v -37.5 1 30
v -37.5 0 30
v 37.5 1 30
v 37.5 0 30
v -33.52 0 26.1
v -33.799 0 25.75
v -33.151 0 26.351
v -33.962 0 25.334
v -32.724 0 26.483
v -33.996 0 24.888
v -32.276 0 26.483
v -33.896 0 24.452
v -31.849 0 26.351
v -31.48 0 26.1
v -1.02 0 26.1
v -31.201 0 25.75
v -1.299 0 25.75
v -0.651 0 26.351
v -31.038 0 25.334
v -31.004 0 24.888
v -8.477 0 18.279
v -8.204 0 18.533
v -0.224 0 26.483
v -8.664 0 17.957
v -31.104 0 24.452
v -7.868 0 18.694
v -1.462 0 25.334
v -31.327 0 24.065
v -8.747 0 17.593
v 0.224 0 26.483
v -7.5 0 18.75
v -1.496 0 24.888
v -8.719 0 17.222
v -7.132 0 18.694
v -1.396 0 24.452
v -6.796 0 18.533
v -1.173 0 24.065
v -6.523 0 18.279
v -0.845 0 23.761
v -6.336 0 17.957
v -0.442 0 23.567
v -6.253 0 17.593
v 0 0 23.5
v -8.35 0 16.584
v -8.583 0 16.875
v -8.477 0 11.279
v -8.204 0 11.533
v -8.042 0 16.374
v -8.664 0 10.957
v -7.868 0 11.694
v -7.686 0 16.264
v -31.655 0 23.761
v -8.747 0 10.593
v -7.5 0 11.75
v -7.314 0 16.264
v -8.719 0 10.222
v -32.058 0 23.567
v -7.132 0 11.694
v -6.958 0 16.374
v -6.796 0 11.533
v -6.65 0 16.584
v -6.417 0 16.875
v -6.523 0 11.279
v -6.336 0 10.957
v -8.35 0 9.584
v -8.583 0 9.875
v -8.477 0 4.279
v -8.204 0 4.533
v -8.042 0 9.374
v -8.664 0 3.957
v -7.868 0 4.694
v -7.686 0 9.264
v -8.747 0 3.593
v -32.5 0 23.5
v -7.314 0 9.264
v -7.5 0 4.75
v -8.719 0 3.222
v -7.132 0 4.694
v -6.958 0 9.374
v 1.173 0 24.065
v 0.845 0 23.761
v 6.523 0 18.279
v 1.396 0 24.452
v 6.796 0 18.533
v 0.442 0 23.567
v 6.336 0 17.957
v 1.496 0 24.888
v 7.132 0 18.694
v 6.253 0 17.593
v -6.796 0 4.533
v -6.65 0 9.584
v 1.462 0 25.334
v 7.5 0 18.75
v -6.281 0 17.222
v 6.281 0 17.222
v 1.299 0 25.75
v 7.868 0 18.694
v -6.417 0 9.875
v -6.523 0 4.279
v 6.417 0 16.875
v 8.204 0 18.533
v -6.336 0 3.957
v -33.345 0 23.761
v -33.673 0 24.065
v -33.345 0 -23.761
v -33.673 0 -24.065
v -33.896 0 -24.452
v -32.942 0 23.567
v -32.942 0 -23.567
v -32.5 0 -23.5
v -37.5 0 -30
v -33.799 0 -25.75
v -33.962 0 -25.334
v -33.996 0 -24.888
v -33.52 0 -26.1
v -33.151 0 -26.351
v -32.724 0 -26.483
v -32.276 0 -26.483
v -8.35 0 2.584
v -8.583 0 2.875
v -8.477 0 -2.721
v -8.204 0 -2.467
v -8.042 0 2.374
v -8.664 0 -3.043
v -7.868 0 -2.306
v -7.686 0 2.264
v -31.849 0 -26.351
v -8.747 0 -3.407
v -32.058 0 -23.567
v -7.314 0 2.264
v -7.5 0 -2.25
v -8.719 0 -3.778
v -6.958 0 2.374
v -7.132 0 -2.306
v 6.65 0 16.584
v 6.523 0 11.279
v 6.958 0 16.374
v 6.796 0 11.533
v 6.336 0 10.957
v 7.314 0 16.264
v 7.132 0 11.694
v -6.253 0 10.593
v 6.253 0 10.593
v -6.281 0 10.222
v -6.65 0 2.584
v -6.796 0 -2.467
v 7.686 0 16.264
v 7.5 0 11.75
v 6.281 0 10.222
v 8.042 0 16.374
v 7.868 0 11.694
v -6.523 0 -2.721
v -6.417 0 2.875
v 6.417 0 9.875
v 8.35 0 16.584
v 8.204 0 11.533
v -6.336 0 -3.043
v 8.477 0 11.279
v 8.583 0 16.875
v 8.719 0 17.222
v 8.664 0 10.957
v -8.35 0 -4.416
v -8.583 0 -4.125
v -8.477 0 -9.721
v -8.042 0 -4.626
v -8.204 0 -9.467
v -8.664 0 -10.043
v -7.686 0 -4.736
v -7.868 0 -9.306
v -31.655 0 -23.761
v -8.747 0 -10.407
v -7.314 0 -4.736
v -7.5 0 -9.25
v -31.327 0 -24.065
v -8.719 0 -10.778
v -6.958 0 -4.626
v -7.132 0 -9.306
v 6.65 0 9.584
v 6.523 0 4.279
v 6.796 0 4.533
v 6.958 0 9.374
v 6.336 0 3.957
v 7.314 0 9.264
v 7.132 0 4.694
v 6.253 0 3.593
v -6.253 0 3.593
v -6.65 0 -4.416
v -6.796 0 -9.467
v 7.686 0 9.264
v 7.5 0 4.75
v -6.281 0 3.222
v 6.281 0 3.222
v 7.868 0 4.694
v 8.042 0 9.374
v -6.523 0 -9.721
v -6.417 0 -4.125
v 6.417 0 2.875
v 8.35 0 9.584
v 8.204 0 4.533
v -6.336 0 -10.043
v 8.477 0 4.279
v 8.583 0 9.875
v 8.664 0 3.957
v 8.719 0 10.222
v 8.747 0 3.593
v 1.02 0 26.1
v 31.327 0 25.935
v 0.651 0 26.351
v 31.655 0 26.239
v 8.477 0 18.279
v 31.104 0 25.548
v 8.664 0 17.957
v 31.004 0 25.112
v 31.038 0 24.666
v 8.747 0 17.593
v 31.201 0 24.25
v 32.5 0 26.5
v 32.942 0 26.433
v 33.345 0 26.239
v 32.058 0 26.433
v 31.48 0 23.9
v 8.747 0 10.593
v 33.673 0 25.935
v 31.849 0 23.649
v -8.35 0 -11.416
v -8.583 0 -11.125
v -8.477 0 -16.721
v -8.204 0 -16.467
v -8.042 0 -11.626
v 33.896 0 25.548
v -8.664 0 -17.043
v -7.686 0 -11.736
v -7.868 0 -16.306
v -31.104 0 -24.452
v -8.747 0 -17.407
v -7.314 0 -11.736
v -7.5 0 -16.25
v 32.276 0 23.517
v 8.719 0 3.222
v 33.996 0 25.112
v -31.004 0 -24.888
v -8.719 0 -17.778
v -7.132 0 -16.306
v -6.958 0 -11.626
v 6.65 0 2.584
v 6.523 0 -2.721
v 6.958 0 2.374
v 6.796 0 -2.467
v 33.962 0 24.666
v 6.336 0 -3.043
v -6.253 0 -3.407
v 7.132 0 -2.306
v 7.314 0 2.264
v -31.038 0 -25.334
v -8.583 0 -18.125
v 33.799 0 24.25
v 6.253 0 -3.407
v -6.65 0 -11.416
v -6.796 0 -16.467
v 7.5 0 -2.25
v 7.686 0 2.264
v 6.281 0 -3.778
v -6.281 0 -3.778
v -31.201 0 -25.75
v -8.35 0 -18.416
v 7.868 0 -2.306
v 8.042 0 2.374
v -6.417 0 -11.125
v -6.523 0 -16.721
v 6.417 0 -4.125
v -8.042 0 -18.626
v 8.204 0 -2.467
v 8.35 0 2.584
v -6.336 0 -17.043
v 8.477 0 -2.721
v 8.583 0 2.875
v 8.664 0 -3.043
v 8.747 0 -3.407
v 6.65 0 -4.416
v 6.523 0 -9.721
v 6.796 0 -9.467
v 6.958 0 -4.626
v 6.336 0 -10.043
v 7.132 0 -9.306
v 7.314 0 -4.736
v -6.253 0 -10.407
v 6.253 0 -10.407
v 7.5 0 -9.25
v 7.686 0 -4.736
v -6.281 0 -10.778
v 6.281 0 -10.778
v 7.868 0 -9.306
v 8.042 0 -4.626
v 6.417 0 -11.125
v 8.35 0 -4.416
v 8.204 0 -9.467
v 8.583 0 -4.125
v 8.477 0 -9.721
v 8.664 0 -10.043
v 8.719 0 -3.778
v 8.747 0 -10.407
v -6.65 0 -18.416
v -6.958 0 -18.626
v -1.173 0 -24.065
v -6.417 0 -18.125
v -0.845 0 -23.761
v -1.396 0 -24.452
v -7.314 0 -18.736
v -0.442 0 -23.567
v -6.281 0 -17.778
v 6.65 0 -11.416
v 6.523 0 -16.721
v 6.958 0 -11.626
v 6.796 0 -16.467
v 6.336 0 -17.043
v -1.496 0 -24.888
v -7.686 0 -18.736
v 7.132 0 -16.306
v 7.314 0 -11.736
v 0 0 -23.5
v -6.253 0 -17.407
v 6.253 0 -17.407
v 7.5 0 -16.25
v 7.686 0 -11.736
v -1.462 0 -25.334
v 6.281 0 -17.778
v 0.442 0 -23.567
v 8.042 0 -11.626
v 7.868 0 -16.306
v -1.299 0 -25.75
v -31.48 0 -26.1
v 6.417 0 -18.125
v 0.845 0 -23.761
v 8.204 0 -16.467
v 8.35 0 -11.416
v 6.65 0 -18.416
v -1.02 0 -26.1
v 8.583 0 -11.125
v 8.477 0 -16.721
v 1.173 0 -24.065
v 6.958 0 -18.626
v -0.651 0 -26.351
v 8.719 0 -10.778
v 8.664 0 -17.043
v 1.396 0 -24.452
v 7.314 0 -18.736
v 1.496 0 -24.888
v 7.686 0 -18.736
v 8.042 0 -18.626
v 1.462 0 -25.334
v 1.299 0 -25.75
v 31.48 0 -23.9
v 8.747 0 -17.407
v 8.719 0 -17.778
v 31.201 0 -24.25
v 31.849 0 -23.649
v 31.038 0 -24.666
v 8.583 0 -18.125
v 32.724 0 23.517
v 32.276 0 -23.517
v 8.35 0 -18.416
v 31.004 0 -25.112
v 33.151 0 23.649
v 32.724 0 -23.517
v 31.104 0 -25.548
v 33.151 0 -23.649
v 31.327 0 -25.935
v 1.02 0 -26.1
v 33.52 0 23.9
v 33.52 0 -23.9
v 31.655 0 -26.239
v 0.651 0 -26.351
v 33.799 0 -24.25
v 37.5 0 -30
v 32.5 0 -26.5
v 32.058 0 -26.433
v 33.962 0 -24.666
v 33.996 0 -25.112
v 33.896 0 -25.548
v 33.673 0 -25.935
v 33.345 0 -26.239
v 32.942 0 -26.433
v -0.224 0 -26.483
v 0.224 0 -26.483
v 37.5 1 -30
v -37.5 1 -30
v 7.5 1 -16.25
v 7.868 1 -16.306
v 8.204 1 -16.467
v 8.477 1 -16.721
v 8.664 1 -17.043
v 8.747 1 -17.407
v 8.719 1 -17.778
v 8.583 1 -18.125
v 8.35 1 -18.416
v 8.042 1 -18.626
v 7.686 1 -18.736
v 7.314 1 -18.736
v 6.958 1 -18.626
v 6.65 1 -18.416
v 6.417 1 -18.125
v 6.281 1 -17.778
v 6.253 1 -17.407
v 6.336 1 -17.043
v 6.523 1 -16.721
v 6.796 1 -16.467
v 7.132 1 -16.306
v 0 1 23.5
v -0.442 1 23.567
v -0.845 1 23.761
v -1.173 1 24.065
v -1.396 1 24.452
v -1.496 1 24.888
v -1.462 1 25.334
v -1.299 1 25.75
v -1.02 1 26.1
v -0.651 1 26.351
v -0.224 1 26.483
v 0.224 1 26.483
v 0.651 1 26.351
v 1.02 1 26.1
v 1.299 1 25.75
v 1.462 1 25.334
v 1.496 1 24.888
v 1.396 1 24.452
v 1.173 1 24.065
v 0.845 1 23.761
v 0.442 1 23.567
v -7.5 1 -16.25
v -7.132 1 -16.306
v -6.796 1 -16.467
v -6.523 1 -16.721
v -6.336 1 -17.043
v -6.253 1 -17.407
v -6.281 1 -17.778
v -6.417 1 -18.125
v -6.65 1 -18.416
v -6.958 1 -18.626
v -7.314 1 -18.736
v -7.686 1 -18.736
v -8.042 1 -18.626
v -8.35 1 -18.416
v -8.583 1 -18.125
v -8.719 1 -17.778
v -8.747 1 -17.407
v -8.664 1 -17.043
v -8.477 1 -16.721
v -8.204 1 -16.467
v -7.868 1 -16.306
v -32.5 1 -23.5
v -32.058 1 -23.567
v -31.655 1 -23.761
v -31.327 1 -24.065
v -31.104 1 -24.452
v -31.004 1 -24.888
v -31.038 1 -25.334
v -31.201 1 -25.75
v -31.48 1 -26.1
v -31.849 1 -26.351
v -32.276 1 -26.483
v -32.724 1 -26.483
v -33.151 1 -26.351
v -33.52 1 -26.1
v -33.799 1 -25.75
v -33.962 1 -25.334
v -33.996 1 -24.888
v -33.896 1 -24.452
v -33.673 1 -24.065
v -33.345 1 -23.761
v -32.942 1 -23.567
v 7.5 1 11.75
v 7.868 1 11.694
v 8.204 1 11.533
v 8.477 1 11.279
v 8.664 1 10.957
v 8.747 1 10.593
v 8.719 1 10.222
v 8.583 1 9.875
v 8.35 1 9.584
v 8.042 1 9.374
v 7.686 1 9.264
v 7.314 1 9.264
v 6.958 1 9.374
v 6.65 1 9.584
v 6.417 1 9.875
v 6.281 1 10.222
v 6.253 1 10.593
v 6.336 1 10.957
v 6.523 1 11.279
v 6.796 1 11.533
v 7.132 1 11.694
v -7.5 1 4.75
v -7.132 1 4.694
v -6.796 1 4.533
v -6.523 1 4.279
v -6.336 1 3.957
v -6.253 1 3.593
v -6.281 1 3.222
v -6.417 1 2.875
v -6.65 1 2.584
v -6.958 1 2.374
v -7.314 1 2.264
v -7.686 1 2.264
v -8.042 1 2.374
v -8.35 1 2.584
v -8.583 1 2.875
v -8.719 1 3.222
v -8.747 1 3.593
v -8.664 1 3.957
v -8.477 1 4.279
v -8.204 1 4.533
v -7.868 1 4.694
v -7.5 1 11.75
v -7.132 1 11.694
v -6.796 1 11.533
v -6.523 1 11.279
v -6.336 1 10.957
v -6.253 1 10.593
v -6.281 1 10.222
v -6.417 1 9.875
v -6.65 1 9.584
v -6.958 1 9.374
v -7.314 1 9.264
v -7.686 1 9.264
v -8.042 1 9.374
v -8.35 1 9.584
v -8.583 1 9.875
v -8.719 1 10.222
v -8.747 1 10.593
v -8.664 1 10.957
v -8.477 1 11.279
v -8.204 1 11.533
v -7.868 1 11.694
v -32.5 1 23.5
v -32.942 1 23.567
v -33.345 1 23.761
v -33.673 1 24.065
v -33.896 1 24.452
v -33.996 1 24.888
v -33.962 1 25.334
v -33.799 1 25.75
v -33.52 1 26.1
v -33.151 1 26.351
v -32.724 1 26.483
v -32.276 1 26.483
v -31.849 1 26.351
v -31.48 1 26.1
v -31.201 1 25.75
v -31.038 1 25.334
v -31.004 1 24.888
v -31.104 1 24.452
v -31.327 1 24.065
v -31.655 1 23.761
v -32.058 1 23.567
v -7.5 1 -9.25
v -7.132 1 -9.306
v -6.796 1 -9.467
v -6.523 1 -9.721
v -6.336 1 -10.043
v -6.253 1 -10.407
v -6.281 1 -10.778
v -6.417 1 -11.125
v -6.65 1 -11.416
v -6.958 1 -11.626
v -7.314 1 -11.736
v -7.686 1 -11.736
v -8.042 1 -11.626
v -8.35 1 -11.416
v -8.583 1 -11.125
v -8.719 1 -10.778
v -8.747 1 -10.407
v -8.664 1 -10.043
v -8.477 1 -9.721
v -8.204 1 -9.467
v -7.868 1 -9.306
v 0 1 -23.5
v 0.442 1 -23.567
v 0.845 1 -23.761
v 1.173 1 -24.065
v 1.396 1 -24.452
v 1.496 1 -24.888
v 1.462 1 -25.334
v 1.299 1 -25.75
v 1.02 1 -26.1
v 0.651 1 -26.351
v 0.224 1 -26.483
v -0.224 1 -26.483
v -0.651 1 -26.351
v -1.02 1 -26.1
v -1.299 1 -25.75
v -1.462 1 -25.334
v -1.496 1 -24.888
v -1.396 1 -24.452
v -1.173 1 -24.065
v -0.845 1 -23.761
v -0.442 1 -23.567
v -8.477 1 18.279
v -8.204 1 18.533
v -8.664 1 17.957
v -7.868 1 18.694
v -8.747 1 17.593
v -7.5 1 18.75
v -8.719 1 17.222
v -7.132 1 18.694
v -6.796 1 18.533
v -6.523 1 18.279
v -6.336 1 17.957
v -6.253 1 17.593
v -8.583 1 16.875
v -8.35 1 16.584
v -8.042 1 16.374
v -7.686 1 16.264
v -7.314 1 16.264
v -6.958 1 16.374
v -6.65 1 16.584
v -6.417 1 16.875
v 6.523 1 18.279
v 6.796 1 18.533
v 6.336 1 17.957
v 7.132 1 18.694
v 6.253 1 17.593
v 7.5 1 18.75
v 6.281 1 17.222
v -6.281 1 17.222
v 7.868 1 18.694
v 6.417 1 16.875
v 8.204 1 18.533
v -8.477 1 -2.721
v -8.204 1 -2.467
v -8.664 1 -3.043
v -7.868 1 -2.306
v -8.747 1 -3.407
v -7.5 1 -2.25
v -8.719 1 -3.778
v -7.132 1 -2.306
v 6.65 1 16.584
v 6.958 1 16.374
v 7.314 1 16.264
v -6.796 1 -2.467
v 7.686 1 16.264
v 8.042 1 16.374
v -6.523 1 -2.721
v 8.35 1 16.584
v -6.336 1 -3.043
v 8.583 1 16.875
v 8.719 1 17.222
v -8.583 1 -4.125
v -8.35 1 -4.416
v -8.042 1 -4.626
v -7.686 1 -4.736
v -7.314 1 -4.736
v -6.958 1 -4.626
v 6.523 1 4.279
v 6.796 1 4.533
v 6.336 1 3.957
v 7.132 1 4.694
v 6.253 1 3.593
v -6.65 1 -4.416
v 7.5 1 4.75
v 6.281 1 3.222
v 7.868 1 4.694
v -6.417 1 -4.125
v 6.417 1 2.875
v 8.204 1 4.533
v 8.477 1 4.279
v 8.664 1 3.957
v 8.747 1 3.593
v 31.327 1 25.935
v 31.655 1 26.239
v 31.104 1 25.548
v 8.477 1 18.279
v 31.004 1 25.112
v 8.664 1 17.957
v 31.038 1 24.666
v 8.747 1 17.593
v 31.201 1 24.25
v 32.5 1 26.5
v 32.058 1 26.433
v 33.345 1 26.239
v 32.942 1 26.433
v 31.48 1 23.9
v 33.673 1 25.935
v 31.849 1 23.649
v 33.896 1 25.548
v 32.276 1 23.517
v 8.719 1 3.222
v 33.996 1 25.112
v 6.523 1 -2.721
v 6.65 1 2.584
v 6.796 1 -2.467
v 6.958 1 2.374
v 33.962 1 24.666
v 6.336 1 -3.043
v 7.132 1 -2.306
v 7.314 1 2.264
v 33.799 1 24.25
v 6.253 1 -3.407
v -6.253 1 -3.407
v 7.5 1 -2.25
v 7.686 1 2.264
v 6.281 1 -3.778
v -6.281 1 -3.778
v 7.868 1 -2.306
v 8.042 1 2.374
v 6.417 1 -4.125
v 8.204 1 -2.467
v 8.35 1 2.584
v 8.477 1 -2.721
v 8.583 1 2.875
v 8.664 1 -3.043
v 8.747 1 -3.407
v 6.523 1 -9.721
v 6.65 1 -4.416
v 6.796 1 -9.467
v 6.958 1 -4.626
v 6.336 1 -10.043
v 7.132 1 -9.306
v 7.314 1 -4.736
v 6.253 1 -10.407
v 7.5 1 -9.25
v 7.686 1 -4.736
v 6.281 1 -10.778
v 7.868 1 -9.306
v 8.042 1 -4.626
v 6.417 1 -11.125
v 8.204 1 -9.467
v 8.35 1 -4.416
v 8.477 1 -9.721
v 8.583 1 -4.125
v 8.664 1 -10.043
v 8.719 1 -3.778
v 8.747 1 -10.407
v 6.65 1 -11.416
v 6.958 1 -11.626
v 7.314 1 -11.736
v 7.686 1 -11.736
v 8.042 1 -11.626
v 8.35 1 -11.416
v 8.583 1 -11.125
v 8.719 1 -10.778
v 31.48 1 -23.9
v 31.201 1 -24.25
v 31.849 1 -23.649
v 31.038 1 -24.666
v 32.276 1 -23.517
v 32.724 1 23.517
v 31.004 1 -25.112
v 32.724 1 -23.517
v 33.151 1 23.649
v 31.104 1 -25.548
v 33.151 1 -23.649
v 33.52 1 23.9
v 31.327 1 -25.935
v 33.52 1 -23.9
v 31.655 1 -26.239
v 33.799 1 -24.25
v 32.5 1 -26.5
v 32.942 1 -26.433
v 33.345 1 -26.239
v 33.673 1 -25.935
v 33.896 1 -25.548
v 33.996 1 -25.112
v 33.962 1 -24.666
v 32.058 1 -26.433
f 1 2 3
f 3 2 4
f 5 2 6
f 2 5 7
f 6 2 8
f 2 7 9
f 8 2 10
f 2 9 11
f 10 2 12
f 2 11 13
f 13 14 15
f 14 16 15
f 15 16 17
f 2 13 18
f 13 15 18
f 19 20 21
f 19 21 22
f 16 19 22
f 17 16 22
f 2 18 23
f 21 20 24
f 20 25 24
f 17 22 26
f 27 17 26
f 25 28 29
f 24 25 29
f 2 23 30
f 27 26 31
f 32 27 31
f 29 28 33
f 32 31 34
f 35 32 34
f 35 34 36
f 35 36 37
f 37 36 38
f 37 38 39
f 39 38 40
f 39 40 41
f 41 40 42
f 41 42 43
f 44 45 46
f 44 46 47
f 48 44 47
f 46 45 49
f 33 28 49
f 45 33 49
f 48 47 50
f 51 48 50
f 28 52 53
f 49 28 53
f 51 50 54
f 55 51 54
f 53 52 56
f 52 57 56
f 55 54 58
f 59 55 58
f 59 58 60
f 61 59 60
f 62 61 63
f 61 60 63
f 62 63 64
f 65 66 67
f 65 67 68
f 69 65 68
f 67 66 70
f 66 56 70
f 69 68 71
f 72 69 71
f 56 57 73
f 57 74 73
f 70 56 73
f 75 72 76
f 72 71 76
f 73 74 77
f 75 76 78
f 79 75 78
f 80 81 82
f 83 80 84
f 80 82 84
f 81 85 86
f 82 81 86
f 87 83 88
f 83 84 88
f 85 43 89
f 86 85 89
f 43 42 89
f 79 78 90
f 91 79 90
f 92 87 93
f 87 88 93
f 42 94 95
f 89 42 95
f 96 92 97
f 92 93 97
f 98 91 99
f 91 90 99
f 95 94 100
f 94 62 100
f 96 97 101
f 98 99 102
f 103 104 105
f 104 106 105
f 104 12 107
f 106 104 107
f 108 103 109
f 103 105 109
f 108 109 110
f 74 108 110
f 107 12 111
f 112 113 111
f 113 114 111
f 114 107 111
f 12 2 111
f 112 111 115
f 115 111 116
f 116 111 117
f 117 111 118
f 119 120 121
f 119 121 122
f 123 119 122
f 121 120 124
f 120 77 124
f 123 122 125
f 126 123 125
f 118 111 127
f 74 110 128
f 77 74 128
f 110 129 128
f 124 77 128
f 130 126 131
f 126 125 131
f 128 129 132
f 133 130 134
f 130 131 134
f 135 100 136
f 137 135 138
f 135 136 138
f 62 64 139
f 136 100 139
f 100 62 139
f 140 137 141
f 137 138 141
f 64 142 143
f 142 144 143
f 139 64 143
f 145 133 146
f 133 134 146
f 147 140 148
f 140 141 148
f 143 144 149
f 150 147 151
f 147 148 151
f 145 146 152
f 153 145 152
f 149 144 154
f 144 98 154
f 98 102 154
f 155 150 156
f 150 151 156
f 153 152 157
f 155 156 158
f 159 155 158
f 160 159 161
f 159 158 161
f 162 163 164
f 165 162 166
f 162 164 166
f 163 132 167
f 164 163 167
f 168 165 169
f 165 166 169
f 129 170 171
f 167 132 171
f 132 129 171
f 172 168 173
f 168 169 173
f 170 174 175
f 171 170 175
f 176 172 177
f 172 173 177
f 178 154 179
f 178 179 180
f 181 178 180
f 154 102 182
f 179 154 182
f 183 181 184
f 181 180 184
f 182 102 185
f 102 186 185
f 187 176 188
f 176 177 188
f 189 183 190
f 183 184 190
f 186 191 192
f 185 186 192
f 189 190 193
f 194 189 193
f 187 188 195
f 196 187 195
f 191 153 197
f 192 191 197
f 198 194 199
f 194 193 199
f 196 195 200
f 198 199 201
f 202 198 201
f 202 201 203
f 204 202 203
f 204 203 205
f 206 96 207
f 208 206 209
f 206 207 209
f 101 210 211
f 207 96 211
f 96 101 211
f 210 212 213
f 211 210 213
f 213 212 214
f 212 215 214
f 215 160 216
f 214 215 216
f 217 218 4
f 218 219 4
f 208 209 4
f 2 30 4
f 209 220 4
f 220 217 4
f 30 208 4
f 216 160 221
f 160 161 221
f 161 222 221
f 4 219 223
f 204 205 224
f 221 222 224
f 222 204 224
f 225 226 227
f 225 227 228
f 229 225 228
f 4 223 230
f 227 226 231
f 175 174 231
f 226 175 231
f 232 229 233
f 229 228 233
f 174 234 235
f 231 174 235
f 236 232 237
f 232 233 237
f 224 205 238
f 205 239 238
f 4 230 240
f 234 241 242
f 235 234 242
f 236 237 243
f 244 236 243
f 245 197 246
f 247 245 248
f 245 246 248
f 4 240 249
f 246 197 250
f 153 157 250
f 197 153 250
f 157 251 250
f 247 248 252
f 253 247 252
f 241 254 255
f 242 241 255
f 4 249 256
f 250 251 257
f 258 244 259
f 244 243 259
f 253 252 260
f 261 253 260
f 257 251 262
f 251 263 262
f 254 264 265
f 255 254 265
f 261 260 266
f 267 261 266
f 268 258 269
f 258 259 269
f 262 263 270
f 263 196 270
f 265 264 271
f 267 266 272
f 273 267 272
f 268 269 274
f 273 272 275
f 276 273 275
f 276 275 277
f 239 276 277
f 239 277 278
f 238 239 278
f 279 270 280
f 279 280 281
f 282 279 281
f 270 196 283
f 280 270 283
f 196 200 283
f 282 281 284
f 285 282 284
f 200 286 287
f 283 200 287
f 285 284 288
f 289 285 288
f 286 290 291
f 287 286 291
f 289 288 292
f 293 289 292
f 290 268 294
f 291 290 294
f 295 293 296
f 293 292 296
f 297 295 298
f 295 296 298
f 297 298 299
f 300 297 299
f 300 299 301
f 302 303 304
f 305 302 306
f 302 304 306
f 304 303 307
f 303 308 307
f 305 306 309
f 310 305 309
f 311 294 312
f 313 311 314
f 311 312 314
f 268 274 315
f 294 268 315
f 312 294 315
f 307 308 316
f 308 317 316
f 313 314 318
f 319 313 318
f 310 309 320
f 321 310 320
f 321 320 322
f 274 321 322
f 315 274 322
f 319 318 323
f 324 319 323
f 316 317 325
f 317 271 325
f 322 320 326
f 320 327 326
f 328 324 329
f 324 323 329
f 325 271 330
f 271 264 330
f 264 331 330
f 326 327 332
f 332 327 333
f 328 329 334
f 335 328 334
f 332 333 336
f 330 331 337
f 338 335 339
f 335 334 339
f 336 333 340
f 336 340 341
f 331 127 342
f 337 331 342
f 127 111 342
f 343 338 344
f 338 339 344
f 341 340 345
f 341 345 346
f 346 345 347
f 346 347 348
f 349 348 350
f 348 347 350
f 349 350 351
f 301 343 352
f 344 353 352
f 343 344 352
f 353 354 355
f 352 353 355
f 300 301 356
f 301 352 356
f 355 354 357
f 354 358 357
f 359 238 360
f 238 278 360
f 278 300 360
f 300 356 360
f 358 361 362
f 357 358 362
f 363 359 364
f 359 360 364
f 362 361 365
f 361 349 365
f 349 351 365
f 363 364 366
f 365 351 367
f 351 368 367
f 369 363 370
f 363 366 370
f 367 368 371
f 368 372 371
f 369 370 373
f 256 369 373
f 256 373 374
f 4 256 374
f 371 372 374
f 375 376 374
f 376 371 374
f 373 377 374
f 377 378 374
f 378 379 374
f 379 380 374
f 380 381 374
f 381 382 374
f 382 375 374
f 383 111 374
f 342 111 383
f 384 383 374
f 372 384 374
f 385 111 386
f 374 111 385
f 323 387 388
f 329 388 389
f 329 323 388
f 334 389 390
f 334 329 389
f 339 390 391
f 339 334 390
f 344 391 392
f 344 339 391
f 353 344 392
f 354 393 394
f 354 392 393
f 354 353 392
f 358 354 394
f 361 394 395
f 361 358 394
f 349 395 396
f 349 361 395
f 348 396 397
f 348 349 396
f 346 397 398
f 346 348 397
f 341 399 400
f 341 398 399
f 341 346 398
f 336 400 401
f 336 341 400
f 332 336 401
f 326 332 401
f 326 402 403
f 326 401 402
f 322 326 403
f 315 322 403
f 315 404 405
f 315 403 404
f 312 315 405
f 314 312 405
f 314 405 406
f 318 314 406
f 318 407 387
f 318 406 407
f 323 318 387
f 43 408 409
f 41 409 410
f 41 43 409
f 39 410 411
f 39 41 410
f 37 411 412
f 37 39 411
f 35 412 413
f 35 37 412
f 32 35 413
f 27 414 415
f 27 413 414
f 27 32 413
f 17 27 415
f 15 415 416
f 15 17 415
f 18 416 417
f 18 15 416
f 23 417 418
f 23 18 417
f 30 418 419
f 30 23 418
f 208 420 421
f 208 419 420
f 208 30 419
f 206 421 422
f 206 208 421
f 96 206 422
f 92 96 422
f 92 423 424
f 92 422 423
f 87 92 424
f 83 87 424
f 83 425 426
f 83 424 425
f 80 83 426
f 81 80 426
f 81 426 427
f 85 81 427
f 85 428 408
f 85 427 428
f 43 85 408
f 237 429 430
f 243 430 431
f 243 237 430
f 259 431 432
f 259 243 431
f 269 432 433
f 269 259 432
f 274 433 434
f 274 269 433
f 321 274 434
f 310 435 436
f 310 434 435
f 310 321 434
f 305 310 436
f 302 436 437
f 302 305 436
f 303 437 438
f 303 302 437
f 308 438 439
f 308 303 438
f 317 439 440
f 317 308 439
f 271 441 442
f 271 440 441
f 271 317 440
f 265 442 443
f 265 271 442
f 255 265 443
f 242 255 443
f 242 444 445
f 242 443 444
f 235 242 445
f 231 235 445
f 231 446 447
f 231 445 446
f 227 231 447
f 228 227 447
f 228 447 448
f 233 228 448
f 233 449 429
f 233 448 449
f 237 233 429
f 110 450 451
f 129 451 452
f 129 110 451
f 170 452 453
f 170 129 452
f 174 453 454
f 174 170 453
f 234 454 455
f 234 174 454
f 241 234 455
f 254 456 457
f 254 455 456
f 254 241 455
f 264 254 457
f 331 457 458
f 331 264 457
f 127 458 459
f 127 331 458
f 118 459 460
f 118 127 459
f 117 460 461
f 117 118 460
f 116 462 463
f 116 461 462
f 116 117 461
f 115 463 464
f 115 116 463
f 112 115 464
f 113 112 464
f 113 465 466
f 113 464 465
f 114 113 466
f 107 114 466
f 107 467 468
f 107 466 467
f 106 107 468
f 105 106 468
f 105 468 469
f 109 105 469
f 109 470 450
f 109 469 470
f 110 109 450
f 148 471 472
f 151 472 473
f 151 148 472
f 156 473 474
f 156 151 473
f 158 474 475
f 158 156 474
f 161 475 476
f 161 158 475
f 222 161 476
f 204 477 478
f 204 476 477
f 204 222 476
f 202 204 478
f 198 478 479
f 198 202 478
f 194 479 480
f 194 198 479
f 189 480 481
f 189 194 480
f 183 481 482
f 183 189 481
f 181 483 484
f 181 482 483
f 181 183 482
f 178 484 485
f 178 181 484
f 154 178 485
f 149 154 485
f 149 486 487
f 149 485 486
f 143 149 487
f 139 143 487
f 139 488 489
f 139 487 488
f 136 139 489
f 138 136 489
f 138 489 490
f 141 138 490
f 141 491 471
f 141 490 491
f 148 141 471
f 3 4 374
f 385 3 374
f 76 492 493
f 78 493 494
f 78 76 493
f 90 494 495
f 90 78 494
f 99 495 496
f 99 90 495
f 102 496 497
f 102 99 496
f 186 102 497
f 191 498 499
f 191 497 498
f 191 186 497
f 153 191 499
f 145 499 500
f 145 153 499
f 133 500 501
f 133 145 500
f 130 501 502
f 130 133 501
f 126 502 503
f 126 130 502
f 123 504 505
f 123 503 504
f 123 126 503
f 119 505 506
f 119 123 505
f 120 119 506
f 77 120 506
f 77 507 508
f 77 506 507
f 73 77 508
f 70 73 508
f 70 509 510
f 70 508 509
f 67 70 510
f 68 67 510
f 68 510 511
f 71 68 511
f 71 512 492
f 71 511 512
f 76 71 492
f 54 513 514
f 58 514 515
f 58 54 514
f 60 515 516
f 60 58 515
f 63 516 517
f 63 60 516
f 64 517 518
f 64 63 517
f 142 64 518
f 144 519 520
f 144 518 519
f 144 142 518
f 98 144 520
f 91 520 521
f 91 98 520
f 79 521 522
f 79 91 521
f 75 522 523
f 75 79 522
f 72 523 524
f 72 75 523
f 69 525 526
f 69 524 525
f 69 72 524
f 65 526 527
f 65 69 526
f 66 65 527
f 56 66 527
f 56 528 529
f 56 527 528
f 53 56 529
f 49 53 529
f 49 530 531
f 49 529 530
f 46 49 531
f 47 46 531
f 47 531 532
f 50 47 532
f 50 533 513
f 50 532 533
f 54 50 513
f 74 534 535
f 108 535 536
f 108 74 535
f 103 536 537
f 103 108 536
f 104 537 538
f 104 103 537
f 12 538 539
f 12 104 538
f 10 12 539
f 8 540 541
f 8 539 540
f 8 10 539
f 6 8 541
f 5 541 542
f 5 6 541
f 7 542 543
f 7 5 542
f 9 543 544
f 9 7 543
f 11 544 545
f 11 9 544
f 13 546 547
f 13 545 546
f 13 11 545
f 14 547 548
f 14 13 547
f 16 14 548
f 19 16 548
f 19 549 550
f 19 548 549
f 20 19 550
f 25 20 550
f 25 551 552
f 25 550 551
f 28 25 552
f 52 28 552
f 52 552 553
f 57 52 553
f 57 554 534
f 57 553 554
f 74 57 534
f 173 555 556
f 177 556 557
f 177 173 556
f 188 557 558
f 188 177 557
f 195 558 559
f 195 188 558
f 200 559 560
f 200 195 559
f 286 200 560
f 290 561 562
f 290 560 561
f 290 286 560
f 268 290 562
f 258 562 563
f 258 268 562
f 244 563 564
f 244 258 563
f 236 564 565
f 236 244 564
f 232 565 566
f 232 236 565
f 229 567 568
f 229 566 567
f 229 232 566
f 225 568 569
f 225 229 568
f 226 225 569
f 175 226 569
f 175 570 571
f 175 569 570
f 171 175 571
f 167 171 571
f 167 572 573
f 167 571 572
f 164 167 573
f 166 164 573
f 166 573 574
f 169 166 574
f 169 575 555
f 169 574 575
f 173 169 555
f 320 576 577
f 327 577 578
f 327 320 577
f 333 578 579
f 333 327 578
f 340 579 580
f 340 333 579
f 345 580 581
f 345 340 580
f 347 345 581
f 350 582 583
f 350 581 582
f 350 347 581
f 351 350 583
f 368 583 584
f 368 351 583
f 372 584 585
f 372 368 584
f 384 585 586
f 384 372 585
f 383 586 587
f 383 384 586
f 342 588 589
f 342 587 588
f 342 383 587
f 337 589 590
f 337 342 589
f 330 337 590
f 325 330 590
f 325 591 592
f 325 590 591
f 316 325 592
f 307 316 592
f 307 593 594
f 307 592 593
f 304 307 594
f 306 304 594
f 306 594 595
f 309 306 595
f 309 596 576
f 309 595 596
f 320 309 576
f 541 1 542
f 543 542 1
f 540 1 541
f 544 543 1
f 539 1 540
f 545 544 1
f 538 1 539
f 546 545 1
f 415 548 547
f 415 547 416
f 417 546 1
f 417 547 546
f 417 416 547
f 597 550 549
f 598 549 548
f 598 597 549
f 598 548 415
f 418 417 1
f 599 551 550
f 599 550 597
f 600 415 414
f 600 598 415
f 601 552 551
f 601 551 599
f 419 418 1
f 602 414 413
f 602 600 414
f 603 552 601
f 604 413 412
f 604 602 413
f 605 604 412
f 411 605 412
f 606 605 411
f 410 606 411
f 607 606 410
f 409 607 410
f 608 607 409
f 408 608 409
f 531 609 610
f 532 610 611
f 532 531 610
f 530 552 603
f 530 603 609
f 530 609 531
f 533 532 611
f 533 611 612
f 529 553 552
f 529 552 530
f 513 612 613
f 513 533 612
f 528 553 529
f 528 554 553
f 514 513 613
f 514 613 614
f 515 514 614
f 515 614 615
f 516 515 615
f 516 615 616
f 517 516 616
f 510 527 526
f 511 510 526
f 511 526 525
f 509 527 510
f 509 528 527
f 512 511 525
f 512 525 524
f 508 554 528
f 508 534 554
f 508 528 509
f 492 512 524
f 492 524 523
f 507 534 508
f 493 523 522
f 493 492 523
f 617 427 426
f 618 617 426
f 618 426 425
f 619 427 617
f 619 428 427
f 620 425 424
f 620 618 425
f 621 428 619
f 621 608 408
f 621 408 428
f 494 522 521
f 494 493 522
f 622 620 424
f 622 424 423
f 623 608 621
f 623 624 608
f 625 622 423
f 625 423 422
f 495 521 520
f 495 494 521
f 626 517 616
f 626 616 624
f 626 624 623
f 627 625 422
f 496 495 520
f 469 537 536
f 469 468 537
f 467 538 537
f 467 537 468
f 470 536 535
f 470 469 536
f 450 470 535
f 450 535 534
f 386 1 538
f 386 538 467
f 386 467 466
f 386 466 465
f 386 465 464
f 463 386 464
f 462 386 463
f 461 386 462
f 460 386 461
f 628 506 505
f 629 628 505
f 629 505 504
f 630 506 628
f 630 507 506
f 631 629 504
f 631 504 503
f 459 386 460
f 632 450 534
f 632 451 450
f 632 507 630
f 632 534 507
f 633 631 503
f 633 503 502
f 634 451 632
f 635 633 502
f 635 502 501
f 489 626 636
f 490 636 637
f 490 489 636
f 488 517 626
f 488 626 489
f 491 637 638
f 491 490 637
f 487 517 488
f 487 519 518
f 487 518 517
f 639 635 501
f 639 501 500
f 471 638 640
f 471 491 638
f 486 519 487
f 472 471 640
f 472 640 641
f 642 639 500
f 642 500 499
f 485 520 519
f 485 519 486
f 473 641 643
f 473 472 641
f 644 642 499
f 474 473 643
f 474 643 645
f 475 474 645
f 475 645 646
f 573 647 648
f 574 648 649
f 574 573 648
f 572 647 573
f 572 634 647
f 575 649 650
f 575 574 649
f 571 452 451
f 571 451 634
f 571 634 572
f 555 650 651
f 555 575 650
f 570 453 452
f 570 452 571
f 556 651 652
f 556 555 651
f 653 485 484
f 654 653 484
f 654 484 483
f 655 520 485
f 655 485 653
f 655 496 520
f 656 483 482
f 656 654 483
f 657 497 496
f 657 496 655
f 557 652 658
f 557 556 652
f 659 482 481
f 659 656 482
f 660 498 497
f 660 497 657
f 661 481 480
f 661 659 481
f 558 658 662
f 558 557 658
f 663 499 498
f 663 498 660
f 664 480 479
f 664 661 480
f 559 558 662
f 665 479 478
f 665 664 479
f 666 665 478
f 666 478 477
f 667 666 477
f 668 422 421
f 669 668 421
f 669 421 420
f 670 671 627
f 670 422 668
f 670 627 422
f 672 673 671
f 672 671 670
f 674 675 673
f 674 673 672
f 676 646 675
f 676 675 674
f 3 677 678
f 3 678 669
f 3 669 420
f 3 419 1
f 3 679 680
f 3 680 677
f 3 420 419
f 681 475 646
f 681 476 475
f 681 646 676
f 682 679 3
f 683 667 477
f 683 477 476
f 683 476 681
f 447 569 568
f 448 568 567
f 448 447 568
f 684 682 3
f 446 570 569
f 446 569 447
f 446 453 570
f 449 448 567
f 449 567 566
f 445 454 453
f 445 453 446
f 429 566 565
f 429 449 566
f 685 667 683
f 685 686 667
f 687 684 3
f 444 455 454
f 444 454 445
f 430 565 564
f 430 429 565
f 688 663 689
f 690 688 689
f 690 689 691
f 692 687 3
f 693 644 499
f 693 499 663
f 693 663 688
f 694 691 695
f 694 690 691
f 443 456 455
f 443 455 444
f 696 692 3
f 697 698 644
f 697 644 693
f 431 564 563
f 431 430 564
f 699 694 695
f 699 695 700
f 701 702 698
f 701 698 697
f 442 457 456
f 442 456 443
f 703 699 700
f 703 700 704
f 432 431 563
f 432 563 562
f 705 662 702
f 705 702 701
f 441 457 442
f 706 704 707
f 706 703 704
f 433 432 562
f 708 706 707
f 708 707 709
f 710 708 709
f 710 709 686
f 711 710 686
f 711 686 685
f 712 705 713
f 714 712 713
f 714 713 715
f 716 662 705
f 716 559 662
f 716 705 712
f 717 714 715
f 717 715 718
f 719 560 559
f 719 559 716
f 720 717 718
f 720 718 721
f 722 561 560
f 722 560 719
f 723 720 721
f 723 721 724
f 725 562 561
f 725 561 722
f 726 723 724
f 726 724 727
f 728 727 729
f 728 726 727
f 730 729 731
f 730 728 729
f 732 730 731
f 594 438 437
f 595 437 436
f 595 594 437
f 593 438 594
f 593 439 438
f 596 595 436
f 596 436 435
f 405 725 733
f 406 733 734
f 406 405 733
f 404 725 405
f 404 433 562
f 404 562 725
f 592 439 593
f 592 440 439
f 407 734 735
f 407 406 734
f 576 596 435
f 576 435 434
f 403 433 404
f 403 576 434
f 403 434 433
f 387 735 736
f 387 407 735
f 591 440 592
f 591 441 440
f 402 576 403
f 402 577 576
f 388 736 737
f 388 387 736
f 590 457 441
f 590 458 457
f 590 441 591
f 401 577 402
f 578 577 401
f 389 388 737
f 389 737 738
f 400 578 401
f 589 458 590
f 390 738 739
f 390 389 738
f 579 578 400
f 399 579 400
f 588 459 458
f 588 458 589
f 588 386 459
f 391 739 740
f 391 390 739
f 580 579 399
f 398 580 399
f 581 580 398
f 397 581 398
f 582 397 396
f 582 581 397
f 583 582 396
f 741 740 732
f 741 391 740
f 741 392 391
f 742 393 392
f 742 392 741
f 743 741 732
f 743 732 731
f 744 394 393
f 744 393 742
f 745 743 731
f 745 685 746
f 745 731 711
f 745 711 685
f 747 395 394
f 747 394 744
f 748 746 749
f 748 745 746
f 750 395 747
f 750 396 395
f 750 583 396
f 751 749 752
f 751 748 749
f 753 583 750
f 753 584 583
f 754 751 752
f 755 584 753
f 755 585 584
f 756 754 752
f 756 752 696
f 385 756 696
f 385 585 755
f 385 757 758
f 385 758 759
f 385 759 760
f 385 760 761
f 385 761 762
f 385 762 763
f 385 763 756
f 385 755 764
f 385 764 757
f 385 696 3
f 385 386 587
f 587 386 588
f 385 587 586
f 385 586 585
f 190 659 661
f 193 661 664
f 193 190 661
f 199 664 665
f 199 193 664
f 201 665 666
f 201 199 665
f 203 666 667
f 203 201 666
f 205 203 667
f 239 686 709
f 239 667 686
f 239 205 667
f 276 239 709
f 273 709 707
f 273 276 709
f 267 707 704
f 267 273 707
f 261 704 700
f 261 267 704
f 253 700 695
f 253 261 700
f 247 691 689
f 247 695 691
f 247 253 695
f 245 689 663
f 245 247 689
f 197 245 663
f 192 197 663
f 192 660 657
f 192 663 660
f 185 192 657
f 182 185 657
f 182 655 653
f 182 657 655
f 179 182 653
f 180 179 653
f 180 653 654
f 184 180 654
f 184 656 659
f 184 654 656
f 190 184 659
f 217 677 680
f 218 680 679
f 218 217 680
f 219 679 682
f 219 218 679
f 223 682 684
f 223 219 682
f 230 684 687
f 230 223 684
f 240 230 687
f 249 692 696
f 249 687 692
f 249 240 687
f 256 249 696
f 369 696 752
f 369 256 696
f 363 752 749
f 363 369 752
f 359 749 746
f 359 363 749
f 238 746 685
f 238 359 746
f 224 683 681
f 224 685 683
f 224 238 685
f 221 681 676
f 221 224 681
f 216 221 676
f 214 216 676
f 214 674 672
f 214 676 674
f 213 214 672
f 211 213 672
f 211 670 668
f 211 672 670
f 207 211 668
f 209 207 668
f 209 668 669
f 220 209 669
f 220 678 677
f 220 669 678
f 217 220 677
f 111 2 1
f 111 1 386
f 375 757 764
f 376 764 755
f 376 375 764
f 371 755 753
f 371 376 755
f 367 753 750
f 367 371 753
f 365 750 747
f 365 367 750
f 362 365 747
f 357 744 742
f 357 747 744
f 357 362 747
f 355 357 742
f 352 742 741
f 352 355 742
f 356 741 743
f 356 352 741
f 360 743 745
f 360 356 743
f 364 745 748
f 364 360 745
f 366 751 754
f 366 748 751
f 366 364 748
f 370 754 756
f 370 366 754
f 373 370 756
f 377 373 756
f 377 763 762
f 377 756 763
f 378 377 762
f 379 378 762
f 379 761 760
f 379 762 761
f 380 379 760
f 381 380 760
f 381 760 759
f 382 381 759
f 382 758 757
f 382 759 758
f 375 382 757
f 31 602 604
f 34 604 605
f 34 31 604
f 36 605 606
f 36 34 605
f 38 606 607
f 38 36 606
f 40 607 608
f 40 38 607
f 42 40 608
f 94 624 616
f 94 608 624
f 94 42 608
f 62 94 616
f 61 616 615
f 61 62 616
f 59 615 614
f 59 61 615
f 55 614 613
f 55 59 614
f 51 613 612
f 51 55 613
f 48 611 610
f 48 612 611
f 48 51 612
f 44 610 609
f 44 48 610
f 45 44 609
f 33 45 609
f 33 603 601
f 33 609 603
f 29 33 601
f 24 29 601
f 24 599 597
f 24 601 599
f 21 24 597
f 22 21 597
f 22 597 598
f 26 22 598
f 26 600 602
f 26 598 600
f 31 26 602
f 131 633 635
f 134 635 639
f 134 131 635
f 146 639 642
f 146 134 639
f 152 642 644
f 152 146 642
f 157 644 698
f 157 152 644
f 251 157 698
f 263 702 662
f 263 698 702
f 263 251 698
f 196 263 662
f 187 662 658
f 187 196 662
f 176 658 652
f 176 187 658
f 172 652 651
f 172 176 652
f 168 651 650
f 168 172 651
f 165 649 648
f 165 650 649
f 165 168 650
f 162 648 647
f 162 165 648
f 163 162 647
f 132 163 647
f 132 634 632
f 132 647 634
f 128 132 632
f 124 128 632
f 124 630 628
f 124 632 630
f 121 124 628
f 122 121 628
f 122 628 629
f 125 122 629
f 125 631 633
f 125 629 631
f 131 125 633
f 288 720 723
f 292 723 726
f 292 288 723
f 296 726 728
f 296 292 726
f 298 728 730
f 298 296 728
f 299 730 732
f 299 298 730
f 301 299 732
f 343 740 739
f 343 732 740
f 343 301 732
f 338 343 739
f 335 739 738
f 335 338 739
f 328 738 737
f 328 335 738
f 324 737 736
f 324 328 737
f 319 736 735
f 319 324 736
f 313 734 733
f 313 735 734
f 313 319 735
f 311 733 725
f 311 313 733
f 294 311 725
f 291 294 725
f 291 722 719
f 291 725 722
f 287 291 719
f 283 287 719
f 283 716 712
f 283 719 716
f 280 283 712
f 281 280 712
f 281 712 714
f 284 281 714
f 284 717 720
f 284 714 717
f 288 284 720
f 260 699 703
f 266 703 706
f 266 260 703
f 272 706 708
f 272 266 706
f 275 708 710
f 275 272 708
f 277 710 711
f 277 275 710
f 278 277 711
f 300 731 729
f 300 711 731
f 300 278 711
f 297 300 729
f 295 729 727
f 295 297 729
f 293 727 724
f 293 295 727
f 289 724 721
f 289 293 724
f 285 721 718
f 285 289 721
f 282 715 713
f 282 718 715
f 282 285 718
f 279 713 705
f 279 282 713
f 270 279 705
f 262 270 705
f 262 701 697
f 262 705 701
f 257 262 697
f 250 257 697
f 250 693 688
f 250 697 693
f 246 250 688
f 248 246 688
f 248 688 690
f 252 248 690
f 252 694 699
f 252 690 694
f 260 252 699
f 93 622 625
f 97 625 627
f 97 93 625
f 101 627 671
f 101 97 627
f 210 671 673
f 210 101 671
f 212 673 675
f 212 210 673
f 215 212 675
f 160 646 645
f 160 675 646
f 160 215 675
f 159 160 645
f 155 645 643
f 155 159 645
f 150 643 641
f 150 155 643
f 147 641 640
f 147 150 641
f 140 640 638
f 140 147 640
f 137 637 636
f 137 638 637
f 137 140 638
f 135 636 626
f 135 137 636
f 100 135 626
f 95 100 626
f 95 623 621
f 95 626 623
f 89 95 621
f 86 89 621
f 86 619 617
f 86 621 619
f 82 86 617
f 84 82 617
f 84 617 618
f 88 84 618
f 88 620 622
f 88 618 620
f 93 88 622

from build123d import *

# Parameters (mm, degrees)
SKETCH_1_W          = 75
SKETCH_1_H          = 60
EXTRUDE_1_DEPTH     = 1
SKETCH_2_R          = 1.25
CUT_EXTRUDE_1_DEPTH = 49.033842236
SKETCH_3_R          = 1.5
CUT_EXTRUDE_2_DEPTH = 49.033842236


with BuildPart() as part:
    # 草图1 → 凸台-拉伸1 (new body)
    with BuildSketch(Plane(origin=(0, 0, 0), x_dir=(1, 0, 0), z_dir=(0, 1, 0))):
        Rectangle(SKETCH_1_W, SKETCH_1_H)
    extrude(amount=EXTRUDE_1_DEPTH)

    # 草图2 → 切除-拉伸1 (cut, through all)
    with BuildSketch(Plane(origin=(0, 0, 0), x_dir=(1, 0, 0), z_dir=(0, 1, 0))):
        with Locations(Location((-7.5, 17.5, 0), (0, 0, 270))):
            Circle(SKETCH_2_R)
        with Locations(Location((7.5, 17.5, 0), (0, 0, 270))):
            Circle(SKETCH_2_R)
        with Locations(Location((7.5, 10.5, 0), (0, 0, 270))):
            Circle(SKETCH_2_R)
        with Locations(Location((7.5, 3.5, 0), (0, 0, 270))):
            Circle(SKETCH_2_R)
        with Locations(Location((7.5, -3.5, 0), (0, 0, 270))):
            Circle(SKETCH_2_R)
        with Locations(Location((7.5, -10.5, 0), (0, 0, 270))):
            Circle(SKETCH_2_R)
        with Locations(Location((7.5, -17.5, 0), (0, 0, 270))):
            Circle(SKETCH_2_R)
        with Locations(Location((-7.5, 10.5, 0), (0, 0, 270))):
            Circle(SKETCH_2_R)
        with Locations(Location((-7.5, 3.5, 0), (0, 0, 270))):
            Circle(SKETCH_2_R)
        with Locations(Location((-7.5, -3.5, 0), (0, 0, 270))):
            Circle(SKETCH_2_R)
        with Locations(Location((-7.5, -10.5, 0), (0, 0, 270))):
            Circle(SKETCH_2_R)
        with Locations(Location((-7.5, -17.5, 0), (0, 0, 270))):
            Circle(SKETCH_2_R)
    extrude(amount=CUT_EXTRUDE_1_DEPTH, mode=Mode.SUBTRACT)

    # 草图3 → 切除-拉伸2 (cut, through all)
    with BuildSketch(Plane(origin=(0, 0, 0), x_dir=(1, 0, 0), z_dir=(0, 1, 0))):
        with Locations(Location((-32.5, 25, 0), (0, 0, 270))):
            Circle(SKETCH_3_R)
        with Locations(Location((32.5, -25, 0), (0, 0, 270))):
            Circle(SKETCH_3_R)
        with Locations(Location((-32.5, -25, 0), (0, 0, 90))):
            Circle(SKETCH_3_R)
        with Locations(Location((32.5, 25, 0), (0, 0, 90))):
            Circle(SKETCH_3_R)
        with Locations(Location((0, -25, 0), (0, 0, 90))):
            Circle(SKETCH_3_R)
        with Locations(Location((0, 25, 0), (0, 0, 270))):
            Circle(SKETCH_3_R)
    extrude(amount=CUT_EXTRUDE_2_DEPTH, mode=Mode.SUBTRACT)


solid = part.part
